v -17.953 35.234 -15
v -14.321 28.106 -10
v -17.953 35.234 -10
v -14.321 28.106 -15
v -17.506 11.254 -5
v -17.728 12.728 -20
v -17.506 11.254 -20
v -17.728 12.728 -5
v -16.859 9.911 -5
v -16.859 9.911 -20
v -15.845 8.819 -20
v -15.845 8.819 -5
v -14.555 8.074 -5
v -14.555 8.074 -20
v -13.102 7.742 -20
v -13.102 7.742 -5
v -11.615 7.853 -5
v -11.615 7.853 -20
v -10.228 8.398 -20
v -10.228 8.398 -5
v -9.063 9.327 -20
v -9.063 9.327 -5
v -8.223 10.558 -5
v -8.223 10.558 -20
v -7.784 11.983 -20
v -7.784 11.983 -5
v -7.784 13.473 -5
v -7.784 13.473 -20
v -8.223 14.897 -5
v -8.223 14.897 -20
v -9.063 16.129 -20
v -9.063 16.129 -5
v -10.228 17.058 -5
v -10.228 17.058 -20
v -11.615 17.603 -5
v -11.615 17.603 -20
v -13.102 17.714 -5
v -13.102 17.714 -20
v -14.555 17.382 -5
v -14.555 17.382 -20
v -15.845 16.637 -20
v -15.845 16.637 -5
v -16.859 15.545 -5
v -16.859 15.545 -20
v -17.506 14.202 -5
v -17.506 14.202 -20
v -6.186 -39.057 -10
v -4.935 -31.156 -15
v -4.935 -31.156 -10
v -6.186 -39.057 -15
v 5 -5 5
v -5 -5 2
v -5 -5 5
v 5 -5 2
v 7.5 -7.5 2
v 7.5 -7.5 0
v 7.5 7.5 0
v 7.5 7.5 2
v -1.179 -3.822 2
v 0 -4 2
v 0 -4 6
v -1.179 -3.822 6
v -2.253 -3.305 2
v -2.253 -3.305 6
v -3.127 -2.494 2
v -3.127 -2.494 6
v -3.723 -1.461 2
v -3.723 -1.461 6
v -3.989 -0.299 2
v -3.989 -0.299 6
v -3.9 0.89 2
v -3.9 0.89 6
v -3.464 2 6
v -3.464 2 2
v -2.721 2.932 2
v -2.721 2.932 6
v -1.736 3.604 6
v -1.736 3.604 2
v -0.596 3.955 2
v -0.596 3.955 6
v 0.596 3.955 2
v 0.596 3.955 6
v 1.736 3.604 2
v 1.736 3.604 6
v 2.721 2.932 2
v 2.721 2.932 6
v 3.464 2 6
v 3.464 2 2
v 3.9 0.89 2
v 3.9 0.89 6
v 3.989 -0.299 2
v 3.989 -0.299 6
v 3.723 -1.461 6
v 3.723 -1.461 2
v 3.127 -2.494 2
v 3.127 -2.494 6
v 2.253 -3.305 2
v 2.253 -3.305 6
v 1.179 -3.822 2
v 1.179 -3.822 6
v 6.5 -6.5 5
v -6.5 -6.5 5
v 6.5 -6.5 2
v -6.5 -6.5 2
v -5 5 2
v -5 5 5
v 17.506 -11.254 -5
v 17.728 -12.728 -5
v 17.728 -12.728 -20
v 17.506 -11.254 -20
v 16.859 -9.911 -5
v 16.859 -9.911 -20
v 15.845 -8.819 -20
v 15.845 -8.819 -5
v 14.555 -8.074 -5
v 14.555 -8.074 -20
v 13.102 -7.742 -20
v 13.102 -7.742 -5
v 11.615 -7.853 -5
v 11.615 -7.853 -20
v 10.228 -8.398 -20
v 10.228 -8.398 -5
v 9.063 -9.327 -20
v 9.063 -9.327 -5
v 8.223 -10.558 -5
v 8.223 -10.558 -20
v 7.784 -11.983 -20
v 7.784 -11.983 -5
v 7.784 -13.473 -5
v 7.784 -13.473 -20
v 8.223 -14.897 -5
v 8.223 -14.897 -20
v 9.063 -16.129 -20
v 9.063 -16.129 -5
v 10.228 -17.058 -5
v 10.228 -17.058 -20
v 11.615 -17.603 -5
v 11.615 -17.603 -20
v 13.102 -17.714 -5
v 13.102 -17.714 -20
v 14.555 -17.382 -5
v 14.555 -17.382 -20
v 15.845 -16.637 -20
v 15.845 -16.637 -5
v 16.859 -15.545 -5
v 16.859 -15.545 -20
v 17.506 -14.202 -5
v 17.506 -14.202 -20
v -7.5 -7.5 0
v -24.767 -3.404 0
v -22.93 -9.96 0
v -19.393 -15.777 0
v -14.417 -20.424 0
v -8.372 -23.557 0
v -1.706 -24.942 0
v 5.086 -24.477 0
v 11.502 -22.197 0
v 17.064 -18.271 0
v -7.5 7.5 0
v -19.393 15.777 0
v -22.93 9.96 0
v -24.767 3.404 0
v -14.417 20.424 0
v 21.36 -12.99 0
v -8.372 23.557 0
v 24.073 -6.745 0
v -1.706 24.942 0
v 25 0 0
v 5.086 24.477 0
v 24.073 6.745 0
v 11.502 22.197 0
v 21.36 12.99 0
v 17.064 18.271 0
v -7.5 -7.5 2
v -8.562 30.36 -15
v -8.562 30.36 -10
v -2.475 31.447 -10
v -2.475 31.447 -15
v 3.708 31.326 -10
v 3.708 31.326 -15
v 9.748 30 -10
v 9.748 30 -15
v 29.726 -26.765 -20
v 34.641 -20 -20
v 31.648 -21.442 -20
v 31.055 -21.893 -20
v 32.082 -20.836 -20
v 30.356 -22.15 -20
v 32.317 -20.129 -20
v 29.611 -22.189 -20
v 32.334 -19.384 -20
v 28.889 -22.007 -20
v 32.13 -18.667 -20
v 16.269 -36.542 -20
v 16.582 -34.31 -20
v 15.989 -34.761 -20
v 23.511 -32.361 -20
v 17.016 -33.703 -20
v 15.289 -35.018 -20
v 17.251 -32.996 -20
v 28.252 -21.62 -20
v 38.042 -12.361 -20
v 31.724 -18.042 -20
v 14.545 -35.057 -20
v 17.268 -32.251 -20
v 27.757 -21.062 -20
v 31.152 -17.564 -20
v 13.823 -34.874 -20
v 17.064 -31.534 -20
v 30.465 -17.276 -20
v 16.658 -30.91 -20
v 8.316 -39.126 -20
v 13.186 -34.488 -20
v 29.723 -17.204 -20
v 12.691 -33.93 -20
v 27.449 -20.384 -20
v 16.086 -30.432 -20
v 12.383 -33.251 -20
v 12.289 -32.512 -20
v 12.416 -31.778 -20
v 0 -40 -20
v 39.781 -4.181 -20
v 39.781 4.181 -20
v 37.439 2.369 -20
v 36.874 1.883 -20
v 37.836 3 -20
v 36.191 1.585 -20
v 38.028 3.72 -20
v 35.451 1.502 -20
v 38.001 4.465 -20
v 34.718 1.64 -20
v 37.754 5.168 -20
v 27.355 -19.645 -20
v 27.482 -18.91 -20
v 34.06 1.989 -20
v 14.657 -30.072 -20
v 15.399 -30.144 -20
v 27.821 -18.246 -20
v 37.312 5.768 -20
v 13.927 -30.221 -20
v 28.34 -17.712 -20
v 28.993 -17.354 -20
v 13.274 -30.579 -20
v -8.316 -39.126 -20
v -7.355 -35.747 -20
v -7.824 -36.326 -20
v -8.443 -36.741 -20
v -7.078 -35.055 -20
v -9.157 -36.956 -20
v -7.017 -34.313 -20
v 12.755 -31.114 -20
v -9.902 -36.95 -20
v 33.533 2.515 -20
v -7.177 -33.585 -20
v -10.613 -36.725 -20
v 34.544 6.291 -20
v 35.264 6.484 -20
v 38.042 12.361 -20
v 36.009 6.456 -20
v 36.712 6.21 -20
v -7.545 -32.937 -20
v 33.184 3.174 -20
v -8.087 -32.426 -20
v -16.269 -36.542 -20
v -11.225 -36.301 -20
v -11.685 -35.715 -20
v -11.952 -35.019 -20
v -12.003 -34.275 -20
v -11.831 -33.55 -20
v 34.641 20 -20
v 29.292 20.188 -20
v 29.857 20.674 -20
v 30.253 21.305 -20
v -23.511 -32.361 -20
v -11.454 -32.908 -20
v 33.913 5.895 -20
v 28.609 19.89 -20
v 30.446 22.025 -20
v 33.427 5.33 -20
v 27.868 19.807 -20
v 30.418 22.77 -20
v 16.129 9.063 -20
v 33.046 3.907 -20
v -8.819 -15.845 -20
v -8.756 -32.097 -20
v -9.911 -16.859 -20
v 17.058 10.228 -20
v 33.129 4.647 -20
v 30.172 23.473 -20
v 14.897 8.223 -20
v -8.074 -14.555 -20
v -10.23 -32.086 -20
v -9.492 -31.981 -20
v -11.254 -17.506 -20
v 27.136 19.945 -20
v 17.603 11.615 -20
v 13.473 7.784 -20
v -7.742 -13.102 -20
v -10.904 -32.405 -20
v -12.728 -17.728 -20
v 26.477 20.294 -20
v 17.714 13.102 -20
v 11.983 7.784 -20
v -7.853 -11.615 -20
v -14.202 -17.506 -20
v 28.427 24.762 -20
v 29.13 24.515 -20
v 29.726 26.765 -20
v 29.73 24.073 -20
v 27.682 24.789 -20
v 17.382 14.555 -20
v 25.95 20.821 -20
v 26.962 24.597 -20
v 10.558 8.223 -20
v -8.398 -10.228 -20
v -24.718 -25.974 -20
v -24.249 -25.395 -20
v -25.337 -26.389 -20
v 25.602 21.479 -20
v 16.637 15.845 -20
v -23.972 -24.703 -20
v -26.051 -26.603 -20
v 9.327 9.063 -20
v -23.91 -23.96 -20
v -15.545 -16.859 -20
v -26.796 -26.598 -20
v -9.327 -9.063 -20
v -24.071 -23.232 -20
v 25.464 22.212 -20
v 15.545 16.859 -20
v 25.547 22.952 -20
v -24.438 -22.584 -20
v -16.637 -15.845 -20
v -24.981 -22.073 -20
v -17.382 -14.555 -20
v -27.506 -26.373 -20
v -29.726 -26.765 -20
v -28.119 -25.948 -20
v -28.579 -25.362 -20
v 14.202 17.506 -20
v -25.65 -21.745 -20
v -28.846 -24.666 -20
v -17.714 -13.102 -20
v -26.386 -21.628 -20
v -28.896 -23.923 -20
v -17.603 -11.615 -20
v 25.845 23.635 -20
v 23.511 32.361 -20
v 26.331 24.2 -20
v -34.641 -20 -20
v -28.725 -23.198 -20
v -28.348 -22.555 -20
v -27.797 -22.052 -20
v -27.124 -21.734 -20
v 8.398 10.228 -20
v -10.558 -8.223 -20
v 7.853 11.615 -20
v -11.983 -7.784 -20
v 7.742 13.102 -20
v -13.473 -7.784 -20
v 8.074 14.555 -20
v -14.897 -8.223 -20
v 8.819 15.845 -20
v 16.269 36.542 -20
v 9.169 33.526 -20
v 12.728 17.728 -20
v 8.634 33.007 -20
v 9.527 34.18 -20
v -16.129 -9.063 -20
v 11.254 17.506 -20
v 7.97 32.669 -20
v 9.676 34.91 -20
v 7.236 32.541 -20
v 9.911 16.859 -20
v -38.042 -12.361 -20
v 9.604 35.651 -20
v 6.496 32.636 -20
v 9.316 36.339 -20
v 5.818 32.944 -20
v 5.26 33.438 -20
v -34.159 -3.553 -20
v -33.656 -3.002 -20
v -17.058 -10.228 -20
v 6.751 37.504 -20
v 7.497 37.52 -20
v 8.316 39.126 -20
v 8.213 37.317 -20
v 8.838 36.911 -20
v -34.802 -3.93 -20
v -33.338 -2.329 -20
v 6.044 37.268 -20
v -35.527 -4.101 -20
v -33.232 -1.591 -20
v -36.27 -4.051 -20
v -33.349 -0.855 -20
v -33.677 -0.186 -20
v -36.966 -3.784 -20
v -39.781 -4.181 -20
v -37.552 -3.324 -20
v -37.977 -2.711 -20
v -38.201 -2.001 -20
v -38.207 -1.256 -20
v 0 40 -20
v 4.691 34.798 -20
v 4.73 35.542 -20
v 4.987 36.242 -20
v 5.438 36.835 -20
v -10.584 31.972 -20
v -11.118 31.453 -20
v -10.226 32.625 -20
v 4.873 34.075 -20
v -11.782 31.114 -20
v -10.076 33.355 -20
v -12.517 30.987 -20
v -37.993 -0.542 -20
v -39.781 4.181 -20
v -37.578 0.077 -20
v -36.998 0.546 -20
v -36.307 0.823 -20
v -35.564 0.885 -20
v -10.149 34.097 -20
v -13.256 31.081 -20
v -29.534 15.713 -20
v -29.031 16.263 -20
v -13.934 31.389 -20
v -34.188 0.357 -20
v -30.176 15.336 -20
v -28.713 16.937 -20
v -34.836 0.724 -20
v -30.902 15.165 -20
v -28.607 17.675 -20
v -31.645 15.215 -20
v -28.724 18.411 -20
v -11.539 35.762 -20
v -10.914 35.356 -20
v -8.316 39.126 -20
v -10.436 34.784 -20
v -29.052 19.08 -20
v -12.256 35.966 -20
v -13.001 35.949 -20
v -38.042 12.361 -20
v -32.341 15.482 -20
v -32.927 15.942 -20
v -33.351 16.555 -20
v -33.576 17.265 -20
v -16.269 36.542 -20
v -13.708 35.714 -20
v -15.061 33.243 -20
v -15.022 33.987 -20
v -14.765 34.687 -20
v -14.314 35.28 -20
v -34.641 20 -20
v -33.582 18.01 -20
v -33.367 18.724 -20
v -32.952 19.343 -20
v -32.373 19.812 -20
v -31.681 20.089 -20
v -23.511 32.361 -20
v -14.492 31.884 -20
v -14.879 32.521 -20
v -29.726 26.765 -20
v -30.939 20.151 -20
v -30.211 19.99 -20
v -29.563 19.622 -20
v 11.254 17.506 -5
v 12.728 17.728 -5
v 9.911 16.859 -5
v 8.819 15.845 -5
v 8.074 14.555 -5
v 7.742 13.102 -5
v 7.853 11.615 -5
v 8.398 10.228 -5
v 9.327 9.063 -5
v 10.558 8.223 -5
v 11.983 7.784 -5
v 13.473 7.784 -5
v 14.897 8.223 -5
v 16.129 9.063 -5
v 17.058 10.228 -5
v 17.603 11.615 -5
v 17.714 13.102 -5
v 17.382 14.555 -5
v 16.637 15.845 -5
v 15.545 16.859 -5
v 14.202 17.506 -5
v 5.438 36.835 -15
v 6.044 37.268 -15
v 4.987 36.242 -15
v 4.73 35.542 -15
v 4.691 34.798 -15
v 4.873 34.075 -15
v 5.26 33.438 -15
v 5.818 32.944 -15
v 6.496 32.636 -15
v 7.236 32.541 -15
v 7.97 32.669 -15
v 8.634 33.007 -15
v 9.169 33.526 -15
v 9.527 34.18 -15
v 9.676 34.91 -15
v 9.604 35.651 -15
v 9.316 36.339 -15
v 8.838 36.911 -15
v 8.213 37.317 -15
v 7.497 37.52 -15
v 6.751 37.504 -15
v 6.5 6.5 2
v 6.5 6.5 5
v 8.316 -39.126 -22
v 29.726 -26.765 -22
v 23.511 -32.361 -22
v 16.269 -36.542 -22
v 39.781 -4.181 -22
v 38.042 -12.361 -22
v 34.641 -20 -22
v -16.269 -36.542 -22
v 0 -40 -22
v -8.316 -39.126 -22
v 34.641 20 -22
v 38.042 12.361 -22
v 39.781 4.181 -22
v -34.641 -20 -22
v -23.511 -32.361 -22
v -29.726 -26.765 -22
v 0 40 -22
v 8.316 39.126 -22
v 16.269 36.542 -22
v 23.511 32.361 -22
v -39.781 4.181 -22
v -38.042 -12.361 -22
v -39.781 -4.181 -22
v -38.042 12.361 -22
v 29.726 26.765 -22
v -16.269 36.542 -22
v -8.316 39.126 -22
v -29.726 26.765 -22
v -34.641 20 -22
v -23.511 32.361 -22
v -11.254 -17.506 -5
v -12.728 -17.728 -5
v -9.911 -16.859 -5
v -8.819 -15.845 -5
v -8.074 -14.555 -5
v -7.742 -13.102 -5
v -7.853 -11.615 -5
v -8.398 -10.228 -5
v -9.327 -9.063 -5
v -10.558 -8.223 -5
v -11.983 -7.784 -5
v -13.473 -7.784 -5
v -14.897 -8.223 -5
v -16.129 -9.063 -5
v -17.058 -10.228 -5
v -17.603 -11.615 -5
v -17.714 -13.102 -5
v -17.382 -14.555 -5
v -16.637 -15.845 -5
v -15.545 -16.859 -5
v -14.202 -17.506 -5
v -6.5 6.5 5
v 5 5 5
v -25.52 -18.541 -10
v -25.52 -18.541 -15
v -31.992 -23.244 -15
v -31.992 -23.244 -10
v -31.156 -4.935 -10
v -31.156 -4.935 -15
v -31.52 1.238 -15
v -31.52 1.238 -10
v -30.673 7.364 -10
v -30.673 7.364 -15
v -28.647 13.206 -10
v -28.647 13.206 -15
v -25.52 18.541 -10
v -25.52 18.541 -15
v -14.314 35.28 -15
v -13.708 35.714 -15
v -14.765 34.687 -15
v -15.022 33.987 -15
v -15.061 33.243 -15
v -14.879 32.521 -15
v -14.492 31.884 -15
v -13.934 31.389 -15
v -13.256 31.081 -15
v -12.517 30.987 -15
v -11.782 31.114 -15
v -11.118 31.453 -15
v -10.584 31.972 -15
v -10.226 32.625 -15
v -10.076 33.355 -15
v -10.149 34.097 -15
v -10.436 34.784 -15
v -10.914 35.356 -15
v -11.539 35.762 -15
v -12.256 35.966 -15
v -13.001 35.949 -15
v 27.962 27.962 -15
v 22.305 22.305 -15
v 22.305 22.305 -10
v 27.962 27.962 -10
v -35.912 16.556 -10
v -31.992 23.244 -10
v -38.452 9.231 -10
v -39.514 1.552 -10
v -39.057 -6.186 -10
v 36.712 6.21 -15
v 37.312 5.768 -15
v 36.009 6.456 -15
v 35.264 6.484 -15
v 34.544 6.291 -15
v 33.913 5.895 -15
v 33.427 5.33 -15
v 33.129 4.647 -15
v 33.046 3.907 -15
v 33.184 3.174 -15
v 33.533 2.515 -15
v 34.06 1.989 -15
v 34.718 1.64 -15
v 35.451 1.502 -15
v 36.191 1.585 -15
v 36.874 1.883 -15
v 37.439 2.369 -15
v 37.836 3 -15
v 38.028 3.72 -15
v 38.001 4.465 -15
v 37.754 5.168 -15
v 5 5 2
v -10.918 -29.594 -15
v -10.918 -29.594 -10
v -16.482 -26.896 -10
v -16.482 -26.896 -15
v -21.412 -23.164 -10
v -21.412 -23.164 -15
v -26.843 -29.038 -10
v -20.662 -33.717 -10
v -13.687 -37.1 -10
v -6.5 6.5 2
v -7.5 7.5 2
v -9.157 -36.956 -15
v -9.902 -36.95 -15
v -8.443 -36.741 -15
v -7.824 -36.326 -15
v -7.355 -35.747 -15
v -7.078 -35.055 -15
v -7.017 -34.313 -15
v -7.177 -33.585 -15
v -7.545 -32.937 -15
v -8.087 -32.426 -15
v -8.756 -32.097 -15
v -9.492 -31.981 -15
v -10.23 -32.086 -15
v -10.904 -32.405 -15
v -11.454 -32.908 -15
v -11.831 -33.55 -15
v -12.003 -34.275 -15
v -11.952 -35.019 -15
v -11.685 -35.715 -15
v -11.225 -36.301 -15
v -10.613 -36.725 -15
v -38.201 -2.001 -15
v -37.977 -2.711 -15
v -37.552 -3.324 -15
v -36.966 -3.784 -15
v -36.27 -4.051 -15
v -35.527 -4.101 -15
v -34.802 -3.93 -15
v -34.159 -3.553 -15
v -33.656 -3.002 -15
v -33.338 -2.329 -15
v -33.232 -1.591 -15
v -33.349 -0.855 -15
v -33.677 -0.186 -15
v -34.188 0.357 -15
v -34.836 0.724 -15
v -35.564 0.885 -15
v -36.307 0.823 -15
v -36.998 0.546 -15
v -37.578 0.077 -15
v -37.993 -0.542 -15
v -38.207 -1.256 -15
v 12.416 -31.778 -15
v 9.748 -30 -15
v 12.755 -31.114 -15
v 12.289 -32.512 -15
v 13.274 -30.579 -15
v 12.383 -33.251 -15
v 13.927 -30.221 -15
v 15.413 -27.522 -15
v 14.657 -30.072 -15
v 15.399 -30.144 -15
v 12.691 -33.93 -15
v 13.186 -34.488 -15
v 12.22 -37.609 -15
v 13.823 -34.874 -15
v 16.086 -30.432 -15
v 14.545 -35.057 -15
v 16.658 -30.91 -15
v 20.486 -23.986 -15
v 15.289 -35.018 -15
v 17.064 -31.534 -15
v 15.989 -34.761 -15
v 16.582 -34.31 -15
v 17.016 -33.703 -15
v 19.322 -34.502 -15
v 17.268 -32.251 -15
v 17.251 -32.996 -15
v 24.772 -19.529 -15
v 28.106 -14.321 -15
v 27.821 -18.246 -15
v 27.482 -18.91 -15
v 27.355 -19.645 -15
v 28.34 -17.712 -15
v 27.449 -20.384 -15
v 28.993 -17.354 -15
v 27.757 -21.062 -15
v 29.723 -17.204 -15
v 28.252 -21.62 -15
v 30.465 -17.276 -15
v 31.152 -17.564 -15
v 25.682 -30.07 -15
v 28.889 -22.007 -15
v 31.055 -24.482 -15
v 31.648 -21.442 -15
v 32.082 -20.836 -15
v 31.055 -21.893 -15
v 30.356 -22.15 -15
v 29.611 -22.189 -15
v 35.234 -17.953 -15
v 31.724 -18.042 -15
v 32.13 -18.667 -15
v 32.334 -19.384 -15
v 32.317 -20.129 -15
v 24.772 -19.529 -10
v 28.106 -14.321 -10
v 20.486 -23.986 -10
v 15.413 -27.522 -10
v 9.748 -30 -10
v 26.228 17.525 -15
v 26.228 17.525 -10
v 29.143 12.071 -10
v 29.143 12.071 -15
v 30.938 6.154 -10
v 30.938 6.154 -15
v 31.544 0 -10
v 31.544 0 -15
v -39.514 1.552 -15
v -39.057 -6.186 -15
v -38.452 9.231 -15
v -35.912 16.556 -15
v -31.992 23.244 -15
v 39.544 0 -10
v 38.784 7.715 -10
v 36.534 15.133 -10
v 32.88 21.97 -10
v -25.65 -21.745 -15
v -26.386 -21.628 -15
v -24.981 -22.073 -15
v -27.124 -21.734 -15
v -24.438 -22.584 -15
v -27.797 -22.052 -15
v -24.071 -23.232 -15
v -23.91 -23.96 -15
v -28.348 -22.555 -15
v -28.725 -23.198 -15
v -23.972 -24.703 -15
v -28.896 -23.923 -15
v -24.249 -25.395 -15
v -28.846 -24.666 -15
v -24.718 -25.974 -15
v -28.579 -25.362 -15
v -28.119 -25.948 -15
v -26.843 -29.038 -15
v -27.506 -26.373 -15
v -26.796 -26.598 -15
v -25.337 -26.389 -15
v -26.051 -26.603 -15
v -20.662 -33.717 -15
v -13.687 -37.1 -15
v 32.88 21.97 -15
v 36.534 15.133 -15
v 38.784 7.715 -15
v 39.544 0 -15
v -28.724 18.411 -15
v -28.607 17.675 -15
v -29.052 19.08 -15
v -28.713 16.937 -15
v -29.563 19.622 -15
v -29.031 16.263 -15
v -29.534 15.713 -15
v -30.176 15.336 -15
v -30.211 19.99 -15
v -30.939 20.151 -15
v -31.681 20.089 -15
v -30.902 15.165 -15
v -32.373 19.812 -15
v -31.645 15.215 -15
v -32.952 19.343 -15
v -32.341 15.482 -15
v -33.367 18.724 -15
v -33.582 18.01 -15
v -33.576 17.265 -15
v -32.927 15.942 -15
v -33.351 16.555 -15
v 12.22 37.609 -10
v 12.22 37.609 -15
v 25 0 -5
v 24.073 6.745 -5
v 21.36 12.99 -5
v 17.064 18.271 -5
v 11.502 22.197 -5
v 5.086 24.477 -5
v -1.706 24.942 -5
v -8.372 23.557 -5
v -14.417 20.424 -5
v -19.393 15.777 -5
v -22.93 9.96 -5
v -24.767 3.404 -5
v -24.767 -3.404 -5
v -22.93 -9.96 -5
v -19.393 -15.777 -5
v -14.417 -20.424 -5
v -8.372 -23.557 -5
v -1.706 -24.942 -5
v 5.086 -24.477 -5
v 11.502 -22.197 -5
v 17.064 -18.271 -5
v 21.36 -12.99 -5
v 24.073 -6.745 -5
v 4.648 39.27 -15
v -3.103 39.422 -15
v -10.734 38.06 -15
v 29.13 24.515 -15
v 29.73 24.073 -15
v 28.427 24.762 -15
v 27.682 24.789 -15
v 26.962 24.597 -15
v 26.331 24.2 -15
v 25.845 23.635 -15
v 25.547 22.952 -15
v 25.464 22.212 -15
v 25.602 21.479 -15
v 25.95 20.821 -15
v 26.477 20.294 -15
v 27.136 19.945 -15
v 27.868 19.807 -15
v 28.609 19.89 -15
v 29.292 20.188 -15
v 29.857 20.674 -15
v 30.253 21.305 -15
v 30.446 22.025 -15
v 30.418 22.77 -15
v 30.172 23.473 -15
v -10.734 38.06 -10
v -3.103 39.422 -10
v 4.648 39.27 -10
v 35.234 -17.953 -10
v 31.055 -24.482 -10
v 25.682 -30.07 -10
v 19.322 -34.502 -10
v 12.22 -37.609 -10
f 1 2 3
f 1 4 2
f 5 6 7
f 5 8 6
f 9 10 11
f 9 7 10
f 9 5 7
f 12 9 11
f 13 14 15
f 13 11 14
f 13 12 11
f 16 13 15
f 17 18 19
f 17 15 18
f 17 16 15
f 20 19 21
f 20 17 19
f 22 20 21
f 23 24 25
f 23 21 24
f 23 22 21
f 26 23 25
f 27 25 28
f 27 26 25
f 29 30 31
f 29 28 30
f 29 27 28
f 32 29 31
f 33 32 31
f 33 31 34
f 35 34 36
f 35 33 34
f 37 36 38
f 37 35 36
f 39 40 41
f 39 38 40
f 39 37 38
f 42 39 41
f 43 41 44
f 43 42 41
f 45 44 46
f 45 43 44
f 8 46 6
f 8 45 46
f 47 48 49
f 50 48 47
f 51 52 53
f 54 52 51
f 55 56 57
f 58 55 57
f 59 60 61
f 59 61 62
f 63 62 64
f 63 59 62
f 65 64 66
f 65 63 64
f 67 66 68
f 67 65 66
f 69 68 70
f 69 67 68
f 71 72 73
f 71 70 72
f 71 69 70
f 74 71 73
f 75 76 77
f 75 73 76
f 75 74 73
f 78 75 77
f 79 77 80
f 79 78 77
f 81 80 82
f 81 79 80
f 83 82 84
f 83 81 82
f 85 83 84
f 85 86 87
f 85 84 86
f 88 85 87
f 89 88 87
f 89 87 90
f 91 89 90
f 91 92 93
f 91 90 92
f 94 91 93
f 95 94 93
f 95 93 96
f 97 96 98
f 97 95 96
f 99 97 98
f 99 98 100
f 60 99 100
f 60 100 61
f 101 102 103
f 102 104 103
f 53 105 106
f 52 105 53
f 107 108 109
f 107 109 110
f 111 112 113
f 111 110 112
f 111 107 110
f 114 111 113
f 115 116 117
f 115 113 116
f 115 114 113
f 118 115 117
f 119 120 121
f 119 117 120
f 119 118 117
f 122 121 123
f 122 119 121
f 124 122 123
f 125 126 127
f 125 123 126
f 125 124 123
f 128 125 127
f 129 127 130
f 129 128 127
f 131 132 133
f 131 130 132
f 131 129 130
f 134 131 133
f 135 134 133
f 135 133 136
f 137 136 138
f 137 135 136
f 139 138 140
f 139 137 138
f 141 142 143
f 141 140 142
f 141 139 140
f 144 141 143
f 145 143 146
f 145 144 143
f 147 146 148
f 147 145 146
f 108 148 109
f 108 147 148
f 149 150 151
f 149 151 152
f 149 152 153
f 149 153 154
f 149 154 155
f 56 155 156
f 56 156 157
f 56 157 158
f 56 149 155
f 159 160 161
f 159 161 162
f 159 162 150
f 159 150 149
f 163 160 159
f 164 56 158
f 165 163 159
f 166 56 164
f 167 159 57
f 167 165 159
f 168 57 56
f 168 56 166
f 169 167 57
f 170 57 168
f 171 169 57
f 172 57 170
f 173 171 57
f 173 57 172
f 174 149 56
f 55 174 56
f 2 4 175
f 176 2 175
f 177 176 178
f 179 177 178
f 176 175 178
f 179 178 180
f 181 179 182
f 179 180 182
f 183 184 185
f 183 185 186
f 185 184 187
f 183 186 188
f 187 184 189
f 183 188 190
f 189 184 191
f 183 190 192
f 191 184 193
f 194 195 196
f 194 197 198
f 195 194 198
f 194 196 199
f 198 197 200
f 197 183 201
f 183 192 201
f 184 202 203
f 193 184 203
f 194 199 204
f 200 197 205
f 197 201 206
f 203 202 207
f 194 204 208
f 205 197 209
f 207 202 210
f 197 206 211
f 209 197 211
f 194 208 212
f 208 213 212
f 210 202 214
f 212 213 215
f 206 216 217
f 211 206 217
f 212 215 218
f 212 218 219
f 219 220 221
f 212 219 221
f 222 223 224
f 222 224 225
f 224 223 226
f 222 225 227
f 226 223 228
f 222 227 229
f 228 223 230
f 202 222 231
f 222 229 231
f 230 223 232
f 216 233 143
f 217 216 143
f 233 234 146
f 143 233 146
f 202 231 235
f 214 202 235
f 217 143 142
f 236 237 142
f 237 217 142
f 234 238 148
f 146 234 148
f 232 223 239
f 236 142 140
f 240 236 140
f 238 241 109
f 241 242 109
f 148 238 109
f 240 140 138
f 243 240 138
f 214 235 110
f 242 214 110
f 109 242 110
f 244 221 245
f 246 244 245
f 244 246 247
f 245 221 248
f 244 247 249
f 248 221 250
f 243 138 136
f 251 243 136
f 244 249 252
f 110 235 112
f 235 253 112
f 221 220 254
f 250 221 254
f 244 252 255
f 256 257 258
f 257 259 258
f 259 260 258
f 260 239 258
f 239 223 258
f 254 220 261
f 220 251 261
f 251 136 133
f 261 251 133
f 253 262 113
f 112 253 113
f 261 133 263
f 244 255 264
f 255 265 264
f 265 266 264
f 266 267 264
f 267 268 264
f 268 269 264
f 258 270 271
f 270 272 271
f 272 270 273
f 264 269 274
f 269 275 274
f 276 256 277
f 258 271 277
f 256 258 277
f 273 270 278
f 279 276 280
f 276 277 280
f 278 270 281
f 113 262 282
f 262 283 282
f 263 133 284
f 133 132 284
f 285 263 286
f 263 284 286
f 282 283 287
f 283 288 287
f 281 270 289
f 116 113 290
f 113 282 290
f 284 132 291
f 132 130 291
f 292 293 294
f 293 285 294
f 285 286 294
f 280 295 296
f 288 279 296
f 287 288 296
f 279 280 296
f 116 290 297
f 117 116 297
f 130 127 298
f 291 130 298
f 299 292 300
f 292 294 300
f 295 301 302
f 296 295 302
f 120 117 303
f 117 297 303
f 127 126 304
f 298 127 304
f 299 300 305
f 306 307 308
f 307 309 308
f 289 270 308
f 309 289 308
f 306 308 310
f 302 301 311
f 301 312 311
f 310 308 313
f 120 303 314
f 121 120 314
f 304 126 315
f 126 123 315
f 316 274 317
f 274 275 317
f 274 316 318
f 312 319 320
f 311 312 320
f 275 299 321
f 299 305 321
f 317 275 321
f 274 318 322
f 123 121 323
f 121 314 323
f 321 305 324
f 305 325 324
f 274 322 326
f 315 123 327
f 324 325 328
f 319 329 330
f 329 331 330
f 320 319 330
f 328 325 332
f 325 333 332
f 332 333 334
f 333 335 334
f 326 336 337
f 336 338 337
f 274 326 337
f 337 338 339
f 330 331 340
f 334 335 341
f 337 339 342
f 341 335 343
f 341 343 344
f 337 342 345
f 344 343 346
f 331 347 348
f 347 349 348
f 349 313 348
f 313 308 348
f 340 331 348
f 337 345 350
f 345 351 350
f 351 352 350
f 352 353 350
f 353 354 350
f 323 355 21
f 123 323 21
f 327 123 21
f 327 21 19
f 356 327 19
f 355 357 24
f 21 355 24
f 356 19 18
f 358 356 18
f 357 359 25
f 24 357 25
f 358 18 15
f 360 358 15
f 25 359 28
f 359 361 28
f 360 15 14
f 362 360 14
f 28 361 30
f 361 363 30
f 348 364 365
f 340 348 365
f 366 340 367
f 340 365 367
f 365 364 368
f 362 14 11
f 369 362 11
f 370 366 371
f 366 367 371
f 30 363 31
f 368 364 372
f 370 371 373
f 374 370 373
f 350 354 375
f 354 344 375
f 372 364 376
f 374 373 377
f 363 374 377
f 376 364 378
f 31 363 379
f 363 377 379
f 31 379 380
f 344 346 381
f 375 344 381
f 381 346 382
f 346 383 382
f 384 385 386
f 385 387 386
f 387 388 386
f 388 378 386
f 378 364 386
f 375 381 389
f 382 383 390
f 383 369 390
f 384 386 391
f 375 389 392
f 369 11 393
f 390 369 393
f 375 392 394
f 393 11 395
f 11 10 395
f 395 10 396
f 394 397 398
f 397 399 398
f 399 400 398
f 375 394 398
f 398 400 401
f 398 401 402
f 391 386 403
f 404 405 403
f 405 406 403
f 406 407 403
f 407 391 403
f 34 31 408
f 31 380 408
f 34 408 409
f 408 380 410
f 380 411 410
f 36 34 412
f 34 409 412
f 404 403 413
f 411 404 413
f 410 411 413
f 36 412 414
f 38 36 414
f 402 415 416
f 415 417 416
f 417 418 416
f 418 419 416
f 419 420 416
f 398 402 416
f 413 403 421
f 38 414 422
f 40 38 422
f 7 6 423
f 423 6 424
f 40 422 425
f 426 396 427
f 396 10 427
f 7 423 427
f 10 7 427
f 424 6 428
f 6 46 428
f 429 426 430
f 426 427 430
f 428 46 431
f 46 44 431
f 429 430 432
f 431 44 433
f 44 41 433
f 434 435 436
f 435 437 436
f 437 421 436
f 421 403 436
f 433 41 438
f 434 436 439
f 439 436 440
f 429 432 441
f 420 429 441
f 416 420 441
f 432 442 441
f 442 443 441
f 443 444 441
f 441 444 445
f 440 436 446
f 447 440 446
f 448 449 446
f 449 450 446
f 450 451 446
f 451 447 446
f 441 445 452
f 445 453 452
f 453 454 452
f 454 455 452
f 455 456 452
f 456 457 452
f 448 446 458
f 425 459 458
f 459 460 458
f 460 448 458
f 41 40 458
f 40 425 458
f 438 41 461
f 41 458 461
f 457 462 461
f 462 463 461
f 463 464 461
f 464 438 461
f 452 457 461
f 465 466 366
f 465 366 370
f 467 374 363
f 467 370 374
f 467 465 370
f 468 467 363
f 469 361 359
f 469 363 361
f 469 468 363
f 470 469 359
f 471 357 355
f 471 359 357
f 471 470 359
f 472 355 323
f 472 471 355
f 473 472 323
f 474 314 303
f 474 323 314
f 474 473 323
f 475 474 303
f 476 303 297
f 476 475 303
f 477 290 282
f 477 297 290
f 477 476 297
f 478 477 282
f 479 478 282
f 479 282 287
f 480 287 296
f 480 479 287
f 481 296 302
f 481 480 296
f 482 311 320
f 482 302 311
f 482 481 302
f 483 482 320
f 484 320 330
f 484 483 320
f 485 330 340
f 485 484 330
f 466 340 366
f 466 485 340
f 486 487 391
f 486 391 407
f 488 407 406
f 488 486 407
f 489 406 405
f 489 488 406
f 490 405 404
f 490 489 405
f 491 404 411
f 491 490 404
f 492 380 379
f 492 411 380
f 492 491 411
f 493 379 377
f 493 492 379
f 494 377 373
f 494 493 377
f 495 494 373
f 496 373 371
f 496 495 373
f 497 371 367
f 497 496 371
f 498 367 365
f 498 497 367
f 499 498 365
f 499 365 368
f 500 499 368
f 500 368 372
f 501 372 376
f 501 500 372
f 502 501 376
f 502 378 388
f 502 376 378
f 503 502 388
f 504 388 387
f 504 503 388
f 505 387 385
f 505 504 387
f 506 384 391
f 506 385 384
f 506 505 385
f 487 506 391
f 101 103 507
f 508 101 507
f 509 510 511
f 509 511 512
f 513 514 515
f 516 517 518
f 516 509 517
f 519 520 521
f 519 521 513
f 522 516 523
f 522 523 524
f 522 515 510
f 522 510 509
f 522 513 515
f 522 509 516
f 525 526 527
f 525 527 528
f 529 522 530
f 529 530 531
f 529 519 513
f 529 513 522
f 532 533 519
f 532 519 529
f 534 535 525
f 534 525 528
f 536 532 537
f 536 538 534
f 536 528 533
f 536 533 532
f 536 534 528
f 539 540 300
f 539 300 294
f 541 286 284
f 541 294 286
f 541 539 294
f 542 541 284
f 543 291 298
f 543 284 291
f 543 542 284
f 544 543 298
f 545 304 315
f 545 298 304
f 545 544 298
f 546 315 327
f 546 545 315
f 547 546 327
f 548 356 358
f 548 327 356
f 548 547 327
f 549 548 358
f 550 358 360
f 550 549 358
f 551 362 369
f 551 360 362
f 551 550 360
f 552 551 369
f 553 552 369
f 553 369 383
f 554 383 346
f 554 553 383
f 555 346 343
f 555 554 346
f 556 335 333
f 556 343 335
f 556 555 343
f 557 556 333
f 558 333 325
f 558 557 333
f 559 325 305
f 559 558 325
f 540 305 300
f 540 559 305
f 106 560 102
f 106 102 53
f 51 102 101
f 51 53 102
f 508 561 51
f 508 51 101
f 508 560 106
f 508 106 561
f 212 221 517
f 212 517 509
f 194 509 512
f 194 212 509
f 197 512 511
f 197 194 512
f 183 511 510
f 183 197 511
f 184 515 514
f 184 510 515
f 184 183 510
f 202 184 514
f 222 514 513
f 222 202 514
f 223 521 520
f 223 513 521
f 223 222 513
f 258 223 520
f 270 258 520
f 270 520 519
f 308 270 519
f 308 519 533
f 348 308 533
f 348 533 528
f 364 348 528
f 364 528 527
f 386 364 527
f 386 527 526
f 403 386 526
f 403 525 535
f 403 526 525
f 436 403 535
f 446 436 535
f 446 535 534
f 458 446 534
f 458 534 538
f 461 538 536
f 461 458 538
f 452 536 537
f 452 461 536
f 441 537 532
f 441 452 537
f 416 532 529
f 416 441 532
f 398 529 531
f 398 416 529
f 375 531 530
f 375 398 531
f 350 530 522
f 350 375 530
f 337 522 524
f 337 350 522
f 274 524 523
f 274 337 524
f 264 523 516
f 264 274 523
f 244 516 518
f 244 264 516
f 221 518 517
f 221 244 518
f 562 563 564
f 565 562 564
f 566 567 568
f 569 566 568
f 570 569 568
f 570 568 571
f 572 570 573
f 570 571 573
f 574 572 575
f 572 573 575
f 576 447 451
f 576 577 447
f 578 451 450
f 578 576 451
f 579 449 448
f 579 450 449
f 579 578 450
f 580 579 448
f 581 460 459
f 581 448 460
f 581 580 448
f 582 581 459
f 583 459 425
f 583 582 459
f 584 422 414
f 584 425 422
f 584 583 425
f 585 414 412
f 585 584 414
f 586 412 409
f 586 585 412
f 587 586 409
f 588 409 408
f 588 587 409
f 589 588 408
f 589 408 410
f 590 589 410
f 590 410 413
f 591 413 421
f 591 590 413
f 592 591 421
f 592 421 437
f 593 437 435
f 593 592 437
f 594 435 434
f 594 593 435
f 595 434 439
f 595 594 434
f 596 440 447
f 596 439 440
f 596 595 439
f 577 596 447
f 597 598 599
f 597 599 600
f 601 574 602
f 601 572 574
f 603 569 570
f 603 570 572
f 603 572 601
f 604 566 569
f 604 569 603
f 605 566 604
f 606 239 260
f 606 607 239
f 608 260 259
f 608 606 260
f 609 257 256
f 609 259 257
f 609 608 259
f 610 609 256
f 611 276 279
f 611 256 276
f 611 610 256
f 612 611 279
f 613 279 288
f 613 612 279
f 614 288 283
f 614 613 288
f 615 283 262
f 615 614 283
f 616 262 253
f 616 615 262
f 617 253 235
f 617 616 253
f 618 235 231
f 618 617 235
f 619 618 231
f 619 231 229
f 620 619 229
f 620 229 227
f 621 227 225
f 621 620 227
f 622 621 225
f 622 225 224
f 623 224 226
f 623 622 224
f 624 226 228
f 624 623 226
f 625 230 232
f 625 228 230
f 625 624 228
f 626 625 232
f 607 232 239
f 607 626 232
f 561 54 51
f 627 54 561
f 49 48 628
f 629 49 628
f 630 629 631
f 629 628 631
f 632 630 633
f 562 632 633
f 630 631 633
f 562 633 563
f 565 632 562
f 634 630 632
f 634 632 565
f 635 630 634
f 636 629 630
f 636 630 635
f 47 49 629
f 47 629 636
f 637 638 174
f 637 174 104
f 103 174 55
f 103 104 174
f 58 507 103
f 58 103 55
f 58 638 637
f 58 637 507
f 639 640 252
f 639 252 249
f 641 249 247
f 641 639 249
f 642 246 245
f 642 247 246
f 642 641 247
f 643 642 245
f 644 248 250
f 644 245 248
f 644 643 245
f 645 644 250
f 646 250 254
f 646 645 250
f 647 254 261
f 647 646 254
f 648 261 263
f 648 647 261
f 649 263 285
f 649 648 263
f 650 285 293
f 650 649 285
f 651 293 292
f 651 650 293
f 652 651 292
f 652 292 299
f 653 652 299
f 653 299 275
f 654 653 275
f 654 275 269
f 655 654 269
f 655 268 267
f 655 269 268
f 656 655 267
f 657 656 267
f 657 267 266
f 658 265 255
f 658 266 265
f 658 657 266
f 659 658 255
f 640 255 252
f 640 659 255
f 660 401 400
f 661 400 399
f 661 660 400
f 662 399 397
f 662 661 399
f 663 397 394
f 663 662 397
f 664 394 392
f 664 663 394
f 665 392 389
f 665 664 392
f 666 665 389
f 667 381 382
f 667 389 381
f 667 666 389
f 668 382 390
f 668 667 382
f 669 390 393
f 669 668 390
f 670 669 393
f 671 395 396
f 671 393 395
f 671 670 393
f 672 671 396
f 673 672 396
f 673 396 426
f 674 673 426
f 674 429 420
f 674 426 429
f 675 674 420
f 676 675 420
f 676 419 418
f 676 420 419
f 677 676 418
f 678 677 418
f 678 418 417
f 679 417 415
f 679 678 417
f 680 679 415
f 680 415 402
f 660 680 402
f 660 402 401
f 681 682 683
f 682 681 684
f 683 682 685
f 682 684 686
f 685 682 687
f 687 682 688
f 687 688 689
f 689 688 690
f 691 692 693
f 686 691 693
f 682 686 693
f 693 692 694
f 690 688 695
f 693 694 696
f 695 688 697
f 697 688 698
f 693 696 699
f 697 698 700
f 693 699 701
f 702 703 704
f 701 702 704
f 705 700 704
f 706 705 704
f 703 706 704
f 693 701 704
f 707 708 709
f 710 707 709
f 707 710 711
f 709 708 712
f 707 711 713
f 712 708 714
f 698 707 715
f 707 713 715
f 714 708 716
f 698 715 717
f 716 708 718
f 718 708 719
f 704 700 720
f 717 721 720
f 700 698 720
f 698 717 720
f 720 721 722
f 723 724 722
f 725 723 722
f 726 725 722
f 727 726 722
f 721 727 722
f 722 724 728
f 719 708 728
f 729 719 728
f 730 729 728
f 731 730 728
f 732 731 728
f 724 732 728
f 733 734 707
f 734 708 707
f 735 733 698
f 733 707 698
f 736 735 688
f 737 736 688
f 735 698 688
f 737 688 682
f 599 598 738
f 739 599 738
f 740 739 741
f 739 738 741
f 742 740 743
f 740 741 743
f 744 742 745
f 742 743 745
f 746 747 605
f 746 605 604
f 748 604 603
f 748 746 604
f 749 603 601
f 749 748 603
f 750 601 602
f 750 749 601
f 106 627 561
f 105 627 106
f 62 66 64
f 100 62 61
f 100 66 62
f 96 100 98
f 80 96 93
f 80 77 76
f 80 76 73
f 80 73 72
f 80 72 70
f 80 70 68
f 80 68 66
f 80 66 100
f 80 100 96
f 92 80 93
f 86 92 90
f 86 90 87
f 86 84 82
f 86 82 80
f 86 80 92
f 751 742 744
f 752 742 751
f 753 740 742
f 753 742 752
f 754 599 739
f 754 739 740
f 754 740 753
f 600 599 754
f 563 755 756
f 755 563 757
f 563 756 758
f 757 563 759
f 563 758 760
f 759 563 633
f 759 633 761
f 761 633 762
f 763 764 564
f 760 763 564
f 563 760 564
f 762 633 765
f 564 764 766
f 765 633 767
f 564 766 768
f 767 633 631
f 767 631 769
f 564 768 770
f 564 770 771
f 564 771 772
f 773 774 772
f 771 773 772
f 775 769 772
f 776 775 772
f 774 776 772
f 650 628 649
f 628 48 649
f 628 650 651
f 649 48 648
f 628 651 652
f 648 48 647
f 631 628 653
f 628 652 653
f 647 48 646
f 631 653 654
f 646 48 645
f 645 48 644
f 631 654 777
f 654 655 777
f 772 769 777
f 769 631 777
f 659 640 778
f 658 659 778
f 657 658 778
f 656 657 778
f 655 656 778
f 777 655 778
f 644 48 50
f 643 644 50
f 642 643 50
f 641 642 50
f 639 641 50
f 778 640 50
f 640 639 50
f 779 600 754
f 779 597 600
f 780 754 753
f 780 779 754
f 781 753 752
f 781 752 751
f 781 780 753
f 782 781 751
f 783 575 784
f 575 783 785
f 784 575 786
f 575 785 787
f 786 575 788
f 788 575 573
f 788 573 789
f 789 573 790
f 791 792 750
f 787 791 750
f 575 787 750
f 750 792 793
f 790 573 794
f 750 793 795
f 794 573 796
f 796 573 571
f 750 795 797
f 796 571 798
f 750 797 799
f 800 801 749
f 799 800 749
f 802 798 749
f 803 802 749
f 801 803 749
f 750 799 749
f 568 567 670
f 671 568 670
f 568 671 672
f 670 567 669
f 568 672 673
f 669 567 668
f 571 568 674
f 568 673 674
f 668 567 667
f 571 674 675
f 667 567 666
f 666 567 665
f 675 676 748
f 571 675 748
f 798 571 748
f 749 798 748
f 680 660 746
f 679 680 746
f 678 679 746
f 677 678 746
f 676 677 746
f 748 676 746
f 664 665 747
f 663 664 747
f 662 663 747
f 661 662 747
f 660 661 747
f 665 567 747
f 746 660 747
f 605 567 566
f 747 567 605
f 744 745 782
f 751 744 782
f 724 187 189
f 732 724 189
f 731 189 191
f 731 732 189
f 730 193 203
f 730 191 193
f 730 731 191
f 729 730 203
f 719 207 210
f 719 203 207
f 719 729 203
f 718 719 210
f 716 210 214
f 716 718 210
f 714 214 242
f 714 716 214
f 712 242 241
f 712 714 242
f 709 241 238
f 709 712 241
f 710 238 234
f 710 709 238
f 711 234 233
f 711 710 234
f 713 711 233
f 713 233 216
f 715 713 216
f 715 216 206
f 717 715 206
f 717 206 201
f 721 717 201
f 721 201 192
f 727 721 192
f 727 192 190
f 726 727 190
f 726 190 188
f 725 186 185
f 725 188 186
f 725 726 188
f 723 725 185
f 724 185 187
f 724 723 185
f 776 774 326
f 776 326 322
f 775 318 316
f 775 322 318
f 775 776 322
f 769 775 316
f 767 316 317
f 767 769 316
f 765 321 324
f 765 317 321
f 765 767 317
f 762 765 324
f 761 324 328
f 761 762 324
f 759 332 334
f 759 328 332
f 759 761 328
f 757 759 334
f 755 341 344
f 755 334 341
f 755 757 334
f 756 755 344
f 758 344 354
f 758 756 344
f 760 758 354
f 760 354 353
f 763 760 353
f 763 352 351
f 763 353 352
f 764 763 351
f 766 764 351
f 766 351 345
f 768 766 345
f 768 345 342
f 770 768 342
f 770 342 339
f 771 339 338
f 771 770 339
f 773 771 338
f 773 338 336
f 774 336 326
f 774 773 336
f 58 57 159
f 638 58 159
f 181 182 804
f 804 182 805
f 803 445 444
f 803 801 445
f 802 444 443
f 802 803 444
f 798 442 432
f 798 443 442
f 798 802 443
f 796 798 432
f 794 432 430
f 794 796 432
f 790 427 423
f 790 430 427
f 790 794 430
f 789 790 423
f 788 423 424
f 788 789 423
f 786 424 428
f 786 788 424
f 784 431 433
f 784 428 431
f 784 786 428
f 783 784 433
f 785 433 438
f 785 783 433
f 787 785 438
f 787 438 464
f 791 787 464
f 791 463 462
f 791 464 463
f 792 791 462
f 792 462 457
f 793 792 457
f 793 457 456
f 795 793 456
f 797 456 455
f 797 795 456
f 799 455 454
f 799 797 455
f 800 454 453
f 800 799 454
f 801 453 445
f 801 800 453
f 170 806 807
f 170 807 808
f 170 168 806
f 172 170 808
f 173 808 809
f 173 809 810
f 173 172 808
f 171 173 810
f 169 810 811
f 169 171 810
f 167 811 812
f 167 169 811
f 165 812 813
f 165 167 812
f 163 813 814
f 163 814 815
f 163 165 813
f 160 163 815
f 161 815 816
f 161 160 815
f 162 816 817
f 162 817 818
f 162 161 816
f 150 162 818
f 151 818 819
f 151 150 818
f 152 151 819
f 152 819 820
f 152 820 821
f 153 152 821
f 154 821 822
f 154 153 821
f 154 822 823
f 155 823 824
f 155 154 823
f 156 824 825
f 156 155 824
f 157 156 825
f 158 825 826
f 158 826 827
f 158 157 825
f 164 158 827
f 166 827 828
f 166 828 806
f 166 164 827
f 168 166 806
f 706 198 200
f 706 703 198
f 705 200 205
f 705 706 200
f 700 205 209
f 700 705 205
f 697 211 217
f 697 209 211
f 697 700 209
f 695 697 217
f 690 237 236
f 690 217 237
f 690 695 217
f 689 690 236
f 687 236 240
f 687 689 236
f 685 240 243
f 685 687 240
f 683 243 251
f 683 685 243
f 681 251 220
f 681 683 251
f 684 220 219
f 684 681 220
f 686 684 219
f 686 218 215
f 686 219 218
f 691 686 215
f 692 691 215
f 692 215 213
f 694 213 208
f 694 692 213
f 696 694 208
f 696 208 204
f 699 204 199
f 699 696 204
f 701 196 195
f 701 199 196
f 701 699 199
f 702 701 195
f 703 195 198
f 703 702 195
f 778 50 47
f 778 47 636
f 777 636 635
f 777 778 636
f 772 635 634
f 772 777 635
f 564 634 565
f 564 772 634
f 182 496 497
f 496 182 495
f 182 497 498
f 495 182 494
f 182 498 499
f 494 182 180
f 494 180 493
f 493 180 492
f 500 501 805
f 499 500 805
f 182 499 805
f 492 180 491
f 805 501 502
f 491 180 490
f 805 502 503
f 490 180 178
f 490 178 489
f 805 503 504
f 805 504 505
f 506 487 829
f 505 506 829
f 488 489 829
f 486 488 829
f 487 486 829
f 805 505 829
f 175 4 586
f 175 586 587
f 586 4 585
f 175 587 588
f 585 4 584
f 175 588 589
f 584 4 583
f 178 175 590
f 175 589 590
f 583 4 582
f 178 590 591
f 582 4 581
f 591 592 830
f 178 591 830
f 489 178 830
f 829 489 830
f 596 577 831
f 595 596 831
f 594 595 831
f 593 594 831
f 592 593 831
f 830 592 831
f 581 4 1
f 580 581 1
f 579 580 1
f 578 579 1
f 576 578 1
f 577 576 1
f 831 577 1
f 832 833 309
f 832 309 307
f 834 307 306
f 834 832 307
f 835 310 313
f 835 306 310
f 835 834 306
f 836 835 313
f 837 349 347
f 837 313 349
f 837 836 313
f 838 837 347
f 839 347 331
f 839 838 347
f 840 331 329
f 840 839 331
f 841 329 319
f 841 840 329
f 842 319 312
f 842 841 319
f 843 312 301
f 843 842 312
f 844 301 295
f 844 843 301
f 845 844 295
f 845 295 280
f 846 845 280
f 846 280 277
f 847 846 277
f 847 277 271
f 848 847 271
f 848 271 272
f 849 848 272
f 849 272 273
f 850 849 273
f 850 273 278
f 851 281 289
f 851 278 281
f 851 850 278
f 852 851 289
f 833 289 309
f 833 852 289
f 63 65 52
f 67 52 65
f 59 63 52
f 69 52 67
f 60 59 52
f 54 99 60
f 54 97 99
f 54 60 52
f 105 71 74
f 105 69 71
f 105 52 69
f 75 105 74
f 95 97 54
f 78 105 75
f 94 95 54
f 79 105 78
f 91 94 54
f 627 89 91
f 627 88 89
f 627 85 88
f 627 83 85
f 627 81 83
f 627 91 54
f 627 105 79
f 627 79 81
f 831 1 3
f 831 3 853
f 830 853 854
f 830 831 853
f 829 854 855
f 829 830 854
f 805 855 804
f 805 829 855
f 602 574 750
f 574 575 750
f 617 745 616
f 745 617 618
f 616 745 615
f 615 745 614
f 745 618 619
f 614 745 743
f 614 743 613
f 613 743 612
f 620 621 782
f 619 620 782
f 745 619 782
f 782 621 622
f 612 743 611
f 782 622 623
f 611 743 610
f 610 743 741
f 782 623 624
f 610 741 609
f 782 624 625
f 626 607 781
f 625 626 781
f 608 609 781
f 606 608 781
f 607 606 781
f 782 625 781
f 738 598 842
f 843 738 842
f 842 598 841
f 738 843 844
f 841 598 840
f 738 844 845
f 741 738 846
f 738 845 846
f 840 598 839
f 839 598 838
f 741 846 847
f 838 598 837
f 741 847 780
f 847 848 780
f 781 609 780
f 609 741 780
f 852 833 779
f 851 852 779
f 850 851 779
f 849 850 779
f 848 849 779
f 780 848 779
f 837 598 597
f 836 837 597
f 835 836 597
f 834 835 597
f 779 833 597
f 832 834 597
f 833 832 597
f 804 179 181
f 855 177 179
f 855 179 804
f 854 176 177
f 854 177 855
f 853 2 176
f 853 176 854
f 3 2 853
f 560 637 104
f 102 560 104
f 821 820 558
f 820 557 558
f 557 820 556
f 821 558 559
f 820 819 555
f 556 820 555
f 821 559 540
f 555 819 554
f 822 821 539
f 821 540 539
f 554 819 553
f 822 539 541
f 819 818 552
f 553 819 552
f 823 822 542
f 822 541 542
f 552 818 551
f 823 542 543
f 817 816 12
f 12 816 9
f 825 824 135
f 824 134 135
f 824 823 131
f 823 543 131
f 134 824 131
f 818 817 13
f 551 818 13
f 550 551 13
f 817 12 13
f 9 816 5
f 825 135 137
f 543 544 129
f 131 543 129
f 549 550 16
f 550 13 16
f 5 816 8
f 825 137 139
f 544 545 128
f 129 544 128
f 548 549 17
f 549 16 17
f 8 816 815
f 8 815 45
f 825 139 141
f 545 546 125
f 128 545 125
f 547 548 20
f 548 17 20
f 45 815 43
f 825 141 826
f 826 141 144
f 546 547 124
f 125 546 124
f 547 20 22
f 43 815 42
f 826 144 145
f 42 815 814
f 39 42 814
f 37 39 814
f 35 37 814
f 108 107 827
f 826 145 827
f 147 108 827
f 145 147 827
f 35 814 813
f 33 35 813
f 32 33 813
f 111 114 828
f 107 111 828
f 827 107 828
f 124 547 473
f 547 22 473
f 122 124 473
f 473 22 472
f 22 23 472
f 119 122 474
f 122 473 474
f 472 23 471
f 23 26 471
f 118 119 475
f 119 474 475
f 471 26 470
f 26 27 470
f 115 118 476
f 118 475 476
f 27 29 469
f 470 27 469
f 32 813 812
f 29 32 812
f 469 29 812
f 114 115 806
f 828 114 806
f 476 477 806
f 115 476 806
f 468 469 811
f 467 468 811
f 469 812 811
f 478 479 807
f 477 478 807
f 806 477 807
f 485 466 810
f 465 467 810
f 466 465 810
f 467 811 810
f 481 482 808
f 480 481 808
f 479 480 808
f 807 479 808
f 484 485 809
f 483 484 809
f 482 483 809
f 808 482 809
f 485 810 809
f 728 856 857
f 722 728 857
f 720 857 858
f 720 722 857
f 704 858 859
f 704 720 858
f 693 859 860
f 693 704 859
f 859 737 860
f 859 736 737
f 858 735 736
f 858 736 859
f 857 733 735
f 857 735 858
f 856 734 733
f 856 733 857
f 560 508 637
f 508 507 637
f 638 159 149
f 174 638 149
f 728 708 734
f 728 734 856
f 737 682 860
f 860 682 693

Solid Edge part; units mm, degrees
sketch "Sketch1" plane through (0, 0, 0) normal (0, 0, 1) x (1, 0, 0)
  circle A0 centre (0, 0) radius 25
extrude "Protrusion1" add sketch "Sketch1" against normal blind 5
sketch "Sketch2" plane through (0, 0, -5) normal (0, 0, -1) x (0, 1, 0)
  circle A0 centre (12.7279, 12.7279) radius 5
extrude "Legs_of_Table_Protrusion" add sketch "Sketch2" along normal blind 15
pattern_circular "Pattern1" count 4 over 360 about axis through (0, 0, 0) along (0, 0, 1) of "Legs_of_Table_Protrusion"
sketch "Sketch3" plane through (0, 0, -15) normal (0, 0, 1) x (1, 0, 0)
  line L0 (31.5442, 0) -> (39.5442, 0)
  arc A0 (22.3051, 22.3051) -> (31.5442, 0) centre (0, 0) cw
  line L1 (22.3051, 22.3051) -> (27.962, 27.962)
  arc A1 (27.962, 27.962) -> (39.5442, 0) centre (0, 0) cw
  dimension "D1" = 8
extrude "Seat_Protrusion" add sketch "Sketch3" along normal blind 5
sketch "Sketch4" plane through (30.9246, 13.981, -15) normal (0, 0, -1) x (0.7071, 0.7071, 0)
  circle A0 centre (-3.7911, 10.3241) radius 2.5
extrude "Protrusion2" add sketch "Sketch4" along normal up to vertex (5 mm away)
sketch "Sketch5" plane through (30.9246, 13.981, -15) normal (0, 0, -1) x (0.7071, 0.7071, 0)
  circle A0 centre (3.7911, -7.981) radius 2.5
extrude "Protrusion3" add sketch "Sketch5" along normal up to vertex (5 mm away)
pattern_circular "Pattern3" count 5 over 360 about axis through (0, 0, 0) along (0, 0, -1) of "Seat_Protrusion", "Protrusion2", "Protrusion3"
sketch "Sketch6" plane through (0, 0, 0) normal (0, 0, 1) x (1, 0, 0)
  line L0 (7.5, -7.5) -> (7.5, 7.5)
  line L1 (7.5, 7.5) -> (-7.5, 7.5)
  line L2 (-7.5, 7.5) -> (-7.5, -7.5)
  line L3 (-7.5, -7.5) -> (7.5, -7.5)
extrude "Button_Base_1" add sketch "Sketch6" along normal blind 2
sketch "Sketch7" plane through (0, 0, 2) normal (0, 0, 1) x (1, 0, 0)
  line L0 (-6.5, 6.5) -> (-6.5, -6.5)
  line L1 (-6.5, -6.5) -> (6.5, -6.5)
  line L2 (6.5, -6.5) -> (6.5, 6.5)
  line L3 (6.5, 6.5) -> (-6.5, 6.5)
  line L4 (-5, 5) -> (-5, -5)
  line L5 (-5, -5) -> (5, -5)
  line L6 (5, -5) -> (5, 5)
  line L7 (5, 5) -> (-5, 5)
extrude "Button_Base_2" add sketch "Sketch7" along normal blind 3
sketch "Sketch8" plane through (0, 0, 2) normal (0, 0, 1) x (0, -1, 0)
  circle A0 centre (0, 0) radius 4
extrude "Emergency_Button_Protrusion" add sketch "Sketch8" along normal blind 4
sketch "Sketch9" plane through (-35.7323, -1.6096, -20) normal (0, 0, -1) x (0, -1, 0)
  circle A0 centre (-1.6096, -35.7323) radius 40
extrude "Base_Protrusion" add sketch "Sketch9" along normal blind 2
